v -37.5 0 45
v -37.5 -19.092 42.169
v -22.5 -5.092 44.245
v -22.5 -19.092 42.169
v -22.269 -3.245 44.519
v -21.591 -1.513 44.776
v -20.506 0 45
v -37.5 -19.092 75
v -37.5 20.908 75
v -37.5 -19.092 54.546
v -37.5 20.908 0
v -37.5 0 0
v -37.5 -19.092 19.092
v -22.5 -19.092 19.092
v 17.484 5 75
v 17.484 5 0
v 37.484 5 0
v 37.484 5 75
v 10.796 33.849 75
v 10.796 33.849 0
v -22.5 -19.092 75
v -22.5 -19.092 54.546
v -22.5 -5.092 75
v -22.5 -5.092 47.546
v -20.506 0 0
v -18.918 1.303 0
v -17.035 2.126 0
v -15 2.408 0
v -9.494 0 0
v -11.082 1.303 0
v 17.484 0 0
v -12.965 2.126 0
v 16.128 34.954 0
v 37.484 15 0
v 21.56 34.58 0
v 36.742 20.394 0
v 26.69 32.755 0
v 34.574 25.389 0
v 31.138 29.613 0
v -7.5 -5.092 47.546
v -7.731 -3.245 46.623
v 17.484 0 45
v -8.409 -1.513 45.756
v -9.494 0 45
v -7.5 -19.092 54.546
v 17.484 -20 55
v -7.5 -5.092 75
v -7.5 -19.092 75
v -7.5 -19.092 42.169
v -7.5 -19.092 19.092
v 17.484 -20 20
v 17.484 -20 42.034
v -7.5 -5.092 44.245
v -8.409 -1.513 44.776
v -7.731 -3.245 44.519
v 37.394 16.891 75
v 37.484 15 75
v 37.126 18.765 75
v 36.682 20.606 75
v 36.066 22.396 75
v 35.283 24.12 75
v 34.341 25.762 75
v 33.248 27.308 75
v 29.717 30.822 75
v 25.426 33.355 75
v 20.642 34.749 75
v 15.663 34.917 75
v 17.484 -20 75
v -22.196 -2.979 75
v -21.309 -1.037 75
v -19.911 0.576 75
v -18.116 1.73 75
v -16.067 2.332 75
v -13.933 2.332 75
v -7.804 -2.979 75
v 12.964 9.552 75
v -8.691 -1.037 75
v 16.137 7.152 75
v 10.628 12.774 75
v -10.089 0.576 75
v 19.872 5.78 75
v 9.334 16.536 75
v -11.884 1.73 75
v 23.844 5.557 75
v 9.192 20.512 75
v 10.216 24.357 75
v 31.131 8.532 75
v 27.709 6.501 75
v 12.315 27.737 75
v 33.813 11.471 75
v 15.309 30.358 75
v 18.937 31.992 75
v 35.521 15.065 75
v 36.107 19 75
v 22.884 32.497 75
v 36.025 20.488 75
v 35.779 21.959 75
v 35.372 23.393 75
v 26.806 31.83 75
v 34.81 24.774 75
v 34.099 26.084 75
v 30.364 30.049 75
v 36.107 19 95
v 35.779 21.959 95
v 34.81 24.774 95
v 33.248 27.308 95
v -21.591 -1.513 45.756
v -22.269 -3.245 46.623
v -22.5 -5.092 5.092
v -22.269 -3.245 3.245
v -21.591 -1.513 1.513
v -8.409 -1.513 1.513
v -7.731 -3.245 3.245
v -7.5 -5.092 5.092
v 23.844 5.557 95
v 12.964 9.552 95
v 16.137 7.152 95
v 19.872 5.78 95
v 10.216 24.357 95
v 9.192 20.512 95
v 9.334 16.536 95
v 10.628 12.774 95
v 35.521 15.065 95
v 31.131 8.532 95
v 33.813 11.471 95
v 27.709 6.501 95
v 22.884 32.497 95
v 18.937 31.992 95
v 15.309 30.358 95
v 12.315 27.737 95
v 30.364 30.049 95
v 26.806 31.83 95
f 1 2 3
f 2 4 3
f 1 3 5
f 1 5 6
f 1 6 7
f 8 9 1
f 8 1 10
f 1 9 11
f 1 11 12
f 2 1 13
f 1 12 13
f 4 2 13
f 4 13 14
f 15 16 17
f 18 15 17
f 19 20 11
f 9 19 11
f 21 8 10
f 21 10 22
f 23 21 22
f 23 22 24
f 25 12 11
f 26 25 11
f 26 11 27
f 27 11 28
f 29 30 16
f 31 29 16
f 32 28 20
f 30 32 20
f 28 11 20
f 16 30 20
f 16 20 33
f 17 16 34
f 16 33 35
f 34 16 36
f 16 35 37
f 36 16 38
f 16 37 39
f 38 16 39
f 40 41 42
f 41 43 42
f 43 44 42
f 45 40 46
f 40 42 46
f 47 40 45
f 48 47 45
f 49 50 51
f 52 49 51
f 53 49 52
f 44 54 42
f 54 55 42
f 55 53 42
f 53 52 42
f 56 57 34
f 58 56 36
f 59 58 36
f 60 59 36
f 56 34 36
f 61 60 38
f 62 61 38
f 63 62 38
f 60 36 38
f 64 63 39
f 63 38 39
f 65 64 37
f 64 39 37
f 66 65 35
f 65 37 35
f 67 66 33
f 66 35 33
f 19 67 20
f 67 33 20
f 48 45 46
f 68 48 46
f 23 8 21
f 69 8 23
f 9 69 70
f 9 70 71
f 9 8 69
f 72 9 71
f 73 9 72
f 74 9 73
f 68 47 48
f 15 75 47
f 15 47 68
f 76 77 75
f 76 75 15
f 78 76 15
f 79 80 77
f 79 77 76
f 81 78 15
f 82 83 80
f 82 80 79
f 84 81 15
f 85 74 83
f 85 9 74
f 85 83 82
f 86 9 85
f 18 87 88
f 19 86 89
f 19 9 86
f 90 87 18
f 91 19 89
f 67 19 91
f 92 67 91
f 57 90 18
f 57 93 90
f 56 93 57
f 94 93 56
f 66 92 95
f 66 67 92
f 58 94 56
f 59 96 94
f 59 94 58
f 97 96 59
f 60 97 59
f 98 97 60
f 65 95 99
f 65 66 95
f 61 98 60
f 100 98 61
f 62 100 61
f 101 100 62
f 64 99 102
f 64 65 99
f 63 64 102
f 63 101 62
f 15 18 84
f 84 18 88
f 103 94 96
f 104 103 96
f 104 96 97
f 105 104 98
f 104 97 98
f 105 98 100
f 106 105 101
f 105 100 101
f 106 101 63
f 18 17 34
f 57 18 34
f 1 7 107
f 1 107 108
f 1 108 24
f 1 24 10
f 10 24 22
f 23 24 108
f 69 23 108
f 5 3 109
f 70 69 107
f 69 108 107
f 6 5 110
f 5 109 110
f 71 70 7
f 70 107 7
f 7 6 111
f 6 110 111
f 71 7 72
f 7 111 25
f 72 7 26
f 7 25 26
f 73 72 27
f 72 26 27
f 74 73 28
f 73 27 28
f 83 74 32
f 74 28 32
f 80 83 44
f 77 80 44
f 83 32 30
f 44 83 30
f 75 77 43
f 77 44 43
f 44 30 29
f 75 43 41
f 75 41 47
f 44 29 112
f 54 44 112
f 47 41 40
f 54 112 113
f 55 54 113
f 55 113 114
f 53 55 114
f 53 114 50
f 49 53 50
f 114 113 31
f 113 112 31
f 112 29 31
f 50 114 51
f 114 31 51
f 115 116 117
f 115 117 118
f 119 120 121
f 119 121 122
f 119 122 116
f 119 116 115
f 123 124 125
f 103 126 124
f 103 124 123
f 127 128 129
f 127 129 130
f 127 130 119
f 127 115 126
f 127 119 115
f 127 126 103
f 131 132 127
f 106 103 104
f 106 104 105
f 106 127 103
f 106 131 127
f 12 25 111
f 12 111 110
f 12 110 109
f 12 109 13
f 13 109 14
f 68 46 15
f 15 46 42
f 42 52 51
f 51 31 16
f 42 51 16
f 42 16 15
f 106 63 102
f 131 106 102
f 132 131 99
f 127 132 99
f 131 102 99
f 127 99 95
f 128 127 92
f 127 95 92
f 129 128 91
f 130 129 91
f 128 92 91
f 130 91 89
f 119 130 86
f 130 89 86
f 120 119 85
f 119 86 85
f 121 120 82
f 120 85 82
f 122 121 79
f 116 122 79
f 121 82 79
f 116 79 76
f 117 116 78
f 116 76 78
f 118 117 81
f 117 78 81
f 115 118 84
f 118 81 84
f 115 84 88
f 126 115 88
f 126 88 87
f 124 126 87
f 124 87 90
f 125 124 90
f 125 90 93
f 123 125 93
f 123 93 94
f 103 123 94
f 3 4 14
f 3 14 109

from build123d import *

# Parameters (mm, degrees)
F1_DEPTH = 75
F3_DEPTH = 75
F5_DEPTH = 75
F7_DEPTH = 20


with BuildPart() as f1:
    # F0 (on Top) → F1 (new body)
    with BuildSketch(Plane.XY):
        with BuildLine():
            Line((-37.5, 20.907951), (-37.5, -19.092049))
            Line((-37.5, -19.092049), (-22.5, -19.092049))
            Line((-22.5, -19.092049), (-22.5, -5.092049))
            ThreePointArc((-22.5, -5.092049), (-15, 2.407951), (-7.5, -5.092049))
            Line((-7.5, -5.092049), (-7.5, -19.092049))
            Line((-7.5, -19.092049), (17.483507, -20))
            Line((17.483507, -20), (17.483507, 5))
            Line((17.483507, 5), (37.483507, 5))
            Line((37.483507, 5), (37.483507, 15))
            ThreePointArc((37.483507, 15), (29.021611, 31.336222), (10.796291, 33.848903))
            Line((10.796291, 33.848903), (-37.5, 20.907951))
        make_face()
    extrude(amount=F1_DEPTH)

    # F2 (on face) → F3 (cut)
    with BuildSketch(Plane.YZ.offset(17.483507)):
        Polygon((-20, 42.03419), (0, 45), (-20, 55), align=None)
    extrude(amount=-F3_DEPTH, mode=Mode.SUBTRACT)

    # F4 (on face) → F5 (cut)
    with BuildSketch(Plane.YZ.offset(17.483507)):
        Polygon((-20, 20), (-20, 0), (0, 0), align=None)
    extrude(amount=-F5_DEPTH, mode=Mode.SUBTRACT)

    # F6 (on face) → F7 (join)
    with BuildSketch(Plane.XY.offset(75)):
        with BuildLine():
            ThreePointArc((33.248047, 27.307692), (9.84171, 14.607072), (36.106982, 19))
            ThreePointArc((36.106982, 19), (35.372255, 23.392928), (33.248047, 27.307692))
        make_face()
    extrude(amount=F7_DEPTH)


solid = f1.part
